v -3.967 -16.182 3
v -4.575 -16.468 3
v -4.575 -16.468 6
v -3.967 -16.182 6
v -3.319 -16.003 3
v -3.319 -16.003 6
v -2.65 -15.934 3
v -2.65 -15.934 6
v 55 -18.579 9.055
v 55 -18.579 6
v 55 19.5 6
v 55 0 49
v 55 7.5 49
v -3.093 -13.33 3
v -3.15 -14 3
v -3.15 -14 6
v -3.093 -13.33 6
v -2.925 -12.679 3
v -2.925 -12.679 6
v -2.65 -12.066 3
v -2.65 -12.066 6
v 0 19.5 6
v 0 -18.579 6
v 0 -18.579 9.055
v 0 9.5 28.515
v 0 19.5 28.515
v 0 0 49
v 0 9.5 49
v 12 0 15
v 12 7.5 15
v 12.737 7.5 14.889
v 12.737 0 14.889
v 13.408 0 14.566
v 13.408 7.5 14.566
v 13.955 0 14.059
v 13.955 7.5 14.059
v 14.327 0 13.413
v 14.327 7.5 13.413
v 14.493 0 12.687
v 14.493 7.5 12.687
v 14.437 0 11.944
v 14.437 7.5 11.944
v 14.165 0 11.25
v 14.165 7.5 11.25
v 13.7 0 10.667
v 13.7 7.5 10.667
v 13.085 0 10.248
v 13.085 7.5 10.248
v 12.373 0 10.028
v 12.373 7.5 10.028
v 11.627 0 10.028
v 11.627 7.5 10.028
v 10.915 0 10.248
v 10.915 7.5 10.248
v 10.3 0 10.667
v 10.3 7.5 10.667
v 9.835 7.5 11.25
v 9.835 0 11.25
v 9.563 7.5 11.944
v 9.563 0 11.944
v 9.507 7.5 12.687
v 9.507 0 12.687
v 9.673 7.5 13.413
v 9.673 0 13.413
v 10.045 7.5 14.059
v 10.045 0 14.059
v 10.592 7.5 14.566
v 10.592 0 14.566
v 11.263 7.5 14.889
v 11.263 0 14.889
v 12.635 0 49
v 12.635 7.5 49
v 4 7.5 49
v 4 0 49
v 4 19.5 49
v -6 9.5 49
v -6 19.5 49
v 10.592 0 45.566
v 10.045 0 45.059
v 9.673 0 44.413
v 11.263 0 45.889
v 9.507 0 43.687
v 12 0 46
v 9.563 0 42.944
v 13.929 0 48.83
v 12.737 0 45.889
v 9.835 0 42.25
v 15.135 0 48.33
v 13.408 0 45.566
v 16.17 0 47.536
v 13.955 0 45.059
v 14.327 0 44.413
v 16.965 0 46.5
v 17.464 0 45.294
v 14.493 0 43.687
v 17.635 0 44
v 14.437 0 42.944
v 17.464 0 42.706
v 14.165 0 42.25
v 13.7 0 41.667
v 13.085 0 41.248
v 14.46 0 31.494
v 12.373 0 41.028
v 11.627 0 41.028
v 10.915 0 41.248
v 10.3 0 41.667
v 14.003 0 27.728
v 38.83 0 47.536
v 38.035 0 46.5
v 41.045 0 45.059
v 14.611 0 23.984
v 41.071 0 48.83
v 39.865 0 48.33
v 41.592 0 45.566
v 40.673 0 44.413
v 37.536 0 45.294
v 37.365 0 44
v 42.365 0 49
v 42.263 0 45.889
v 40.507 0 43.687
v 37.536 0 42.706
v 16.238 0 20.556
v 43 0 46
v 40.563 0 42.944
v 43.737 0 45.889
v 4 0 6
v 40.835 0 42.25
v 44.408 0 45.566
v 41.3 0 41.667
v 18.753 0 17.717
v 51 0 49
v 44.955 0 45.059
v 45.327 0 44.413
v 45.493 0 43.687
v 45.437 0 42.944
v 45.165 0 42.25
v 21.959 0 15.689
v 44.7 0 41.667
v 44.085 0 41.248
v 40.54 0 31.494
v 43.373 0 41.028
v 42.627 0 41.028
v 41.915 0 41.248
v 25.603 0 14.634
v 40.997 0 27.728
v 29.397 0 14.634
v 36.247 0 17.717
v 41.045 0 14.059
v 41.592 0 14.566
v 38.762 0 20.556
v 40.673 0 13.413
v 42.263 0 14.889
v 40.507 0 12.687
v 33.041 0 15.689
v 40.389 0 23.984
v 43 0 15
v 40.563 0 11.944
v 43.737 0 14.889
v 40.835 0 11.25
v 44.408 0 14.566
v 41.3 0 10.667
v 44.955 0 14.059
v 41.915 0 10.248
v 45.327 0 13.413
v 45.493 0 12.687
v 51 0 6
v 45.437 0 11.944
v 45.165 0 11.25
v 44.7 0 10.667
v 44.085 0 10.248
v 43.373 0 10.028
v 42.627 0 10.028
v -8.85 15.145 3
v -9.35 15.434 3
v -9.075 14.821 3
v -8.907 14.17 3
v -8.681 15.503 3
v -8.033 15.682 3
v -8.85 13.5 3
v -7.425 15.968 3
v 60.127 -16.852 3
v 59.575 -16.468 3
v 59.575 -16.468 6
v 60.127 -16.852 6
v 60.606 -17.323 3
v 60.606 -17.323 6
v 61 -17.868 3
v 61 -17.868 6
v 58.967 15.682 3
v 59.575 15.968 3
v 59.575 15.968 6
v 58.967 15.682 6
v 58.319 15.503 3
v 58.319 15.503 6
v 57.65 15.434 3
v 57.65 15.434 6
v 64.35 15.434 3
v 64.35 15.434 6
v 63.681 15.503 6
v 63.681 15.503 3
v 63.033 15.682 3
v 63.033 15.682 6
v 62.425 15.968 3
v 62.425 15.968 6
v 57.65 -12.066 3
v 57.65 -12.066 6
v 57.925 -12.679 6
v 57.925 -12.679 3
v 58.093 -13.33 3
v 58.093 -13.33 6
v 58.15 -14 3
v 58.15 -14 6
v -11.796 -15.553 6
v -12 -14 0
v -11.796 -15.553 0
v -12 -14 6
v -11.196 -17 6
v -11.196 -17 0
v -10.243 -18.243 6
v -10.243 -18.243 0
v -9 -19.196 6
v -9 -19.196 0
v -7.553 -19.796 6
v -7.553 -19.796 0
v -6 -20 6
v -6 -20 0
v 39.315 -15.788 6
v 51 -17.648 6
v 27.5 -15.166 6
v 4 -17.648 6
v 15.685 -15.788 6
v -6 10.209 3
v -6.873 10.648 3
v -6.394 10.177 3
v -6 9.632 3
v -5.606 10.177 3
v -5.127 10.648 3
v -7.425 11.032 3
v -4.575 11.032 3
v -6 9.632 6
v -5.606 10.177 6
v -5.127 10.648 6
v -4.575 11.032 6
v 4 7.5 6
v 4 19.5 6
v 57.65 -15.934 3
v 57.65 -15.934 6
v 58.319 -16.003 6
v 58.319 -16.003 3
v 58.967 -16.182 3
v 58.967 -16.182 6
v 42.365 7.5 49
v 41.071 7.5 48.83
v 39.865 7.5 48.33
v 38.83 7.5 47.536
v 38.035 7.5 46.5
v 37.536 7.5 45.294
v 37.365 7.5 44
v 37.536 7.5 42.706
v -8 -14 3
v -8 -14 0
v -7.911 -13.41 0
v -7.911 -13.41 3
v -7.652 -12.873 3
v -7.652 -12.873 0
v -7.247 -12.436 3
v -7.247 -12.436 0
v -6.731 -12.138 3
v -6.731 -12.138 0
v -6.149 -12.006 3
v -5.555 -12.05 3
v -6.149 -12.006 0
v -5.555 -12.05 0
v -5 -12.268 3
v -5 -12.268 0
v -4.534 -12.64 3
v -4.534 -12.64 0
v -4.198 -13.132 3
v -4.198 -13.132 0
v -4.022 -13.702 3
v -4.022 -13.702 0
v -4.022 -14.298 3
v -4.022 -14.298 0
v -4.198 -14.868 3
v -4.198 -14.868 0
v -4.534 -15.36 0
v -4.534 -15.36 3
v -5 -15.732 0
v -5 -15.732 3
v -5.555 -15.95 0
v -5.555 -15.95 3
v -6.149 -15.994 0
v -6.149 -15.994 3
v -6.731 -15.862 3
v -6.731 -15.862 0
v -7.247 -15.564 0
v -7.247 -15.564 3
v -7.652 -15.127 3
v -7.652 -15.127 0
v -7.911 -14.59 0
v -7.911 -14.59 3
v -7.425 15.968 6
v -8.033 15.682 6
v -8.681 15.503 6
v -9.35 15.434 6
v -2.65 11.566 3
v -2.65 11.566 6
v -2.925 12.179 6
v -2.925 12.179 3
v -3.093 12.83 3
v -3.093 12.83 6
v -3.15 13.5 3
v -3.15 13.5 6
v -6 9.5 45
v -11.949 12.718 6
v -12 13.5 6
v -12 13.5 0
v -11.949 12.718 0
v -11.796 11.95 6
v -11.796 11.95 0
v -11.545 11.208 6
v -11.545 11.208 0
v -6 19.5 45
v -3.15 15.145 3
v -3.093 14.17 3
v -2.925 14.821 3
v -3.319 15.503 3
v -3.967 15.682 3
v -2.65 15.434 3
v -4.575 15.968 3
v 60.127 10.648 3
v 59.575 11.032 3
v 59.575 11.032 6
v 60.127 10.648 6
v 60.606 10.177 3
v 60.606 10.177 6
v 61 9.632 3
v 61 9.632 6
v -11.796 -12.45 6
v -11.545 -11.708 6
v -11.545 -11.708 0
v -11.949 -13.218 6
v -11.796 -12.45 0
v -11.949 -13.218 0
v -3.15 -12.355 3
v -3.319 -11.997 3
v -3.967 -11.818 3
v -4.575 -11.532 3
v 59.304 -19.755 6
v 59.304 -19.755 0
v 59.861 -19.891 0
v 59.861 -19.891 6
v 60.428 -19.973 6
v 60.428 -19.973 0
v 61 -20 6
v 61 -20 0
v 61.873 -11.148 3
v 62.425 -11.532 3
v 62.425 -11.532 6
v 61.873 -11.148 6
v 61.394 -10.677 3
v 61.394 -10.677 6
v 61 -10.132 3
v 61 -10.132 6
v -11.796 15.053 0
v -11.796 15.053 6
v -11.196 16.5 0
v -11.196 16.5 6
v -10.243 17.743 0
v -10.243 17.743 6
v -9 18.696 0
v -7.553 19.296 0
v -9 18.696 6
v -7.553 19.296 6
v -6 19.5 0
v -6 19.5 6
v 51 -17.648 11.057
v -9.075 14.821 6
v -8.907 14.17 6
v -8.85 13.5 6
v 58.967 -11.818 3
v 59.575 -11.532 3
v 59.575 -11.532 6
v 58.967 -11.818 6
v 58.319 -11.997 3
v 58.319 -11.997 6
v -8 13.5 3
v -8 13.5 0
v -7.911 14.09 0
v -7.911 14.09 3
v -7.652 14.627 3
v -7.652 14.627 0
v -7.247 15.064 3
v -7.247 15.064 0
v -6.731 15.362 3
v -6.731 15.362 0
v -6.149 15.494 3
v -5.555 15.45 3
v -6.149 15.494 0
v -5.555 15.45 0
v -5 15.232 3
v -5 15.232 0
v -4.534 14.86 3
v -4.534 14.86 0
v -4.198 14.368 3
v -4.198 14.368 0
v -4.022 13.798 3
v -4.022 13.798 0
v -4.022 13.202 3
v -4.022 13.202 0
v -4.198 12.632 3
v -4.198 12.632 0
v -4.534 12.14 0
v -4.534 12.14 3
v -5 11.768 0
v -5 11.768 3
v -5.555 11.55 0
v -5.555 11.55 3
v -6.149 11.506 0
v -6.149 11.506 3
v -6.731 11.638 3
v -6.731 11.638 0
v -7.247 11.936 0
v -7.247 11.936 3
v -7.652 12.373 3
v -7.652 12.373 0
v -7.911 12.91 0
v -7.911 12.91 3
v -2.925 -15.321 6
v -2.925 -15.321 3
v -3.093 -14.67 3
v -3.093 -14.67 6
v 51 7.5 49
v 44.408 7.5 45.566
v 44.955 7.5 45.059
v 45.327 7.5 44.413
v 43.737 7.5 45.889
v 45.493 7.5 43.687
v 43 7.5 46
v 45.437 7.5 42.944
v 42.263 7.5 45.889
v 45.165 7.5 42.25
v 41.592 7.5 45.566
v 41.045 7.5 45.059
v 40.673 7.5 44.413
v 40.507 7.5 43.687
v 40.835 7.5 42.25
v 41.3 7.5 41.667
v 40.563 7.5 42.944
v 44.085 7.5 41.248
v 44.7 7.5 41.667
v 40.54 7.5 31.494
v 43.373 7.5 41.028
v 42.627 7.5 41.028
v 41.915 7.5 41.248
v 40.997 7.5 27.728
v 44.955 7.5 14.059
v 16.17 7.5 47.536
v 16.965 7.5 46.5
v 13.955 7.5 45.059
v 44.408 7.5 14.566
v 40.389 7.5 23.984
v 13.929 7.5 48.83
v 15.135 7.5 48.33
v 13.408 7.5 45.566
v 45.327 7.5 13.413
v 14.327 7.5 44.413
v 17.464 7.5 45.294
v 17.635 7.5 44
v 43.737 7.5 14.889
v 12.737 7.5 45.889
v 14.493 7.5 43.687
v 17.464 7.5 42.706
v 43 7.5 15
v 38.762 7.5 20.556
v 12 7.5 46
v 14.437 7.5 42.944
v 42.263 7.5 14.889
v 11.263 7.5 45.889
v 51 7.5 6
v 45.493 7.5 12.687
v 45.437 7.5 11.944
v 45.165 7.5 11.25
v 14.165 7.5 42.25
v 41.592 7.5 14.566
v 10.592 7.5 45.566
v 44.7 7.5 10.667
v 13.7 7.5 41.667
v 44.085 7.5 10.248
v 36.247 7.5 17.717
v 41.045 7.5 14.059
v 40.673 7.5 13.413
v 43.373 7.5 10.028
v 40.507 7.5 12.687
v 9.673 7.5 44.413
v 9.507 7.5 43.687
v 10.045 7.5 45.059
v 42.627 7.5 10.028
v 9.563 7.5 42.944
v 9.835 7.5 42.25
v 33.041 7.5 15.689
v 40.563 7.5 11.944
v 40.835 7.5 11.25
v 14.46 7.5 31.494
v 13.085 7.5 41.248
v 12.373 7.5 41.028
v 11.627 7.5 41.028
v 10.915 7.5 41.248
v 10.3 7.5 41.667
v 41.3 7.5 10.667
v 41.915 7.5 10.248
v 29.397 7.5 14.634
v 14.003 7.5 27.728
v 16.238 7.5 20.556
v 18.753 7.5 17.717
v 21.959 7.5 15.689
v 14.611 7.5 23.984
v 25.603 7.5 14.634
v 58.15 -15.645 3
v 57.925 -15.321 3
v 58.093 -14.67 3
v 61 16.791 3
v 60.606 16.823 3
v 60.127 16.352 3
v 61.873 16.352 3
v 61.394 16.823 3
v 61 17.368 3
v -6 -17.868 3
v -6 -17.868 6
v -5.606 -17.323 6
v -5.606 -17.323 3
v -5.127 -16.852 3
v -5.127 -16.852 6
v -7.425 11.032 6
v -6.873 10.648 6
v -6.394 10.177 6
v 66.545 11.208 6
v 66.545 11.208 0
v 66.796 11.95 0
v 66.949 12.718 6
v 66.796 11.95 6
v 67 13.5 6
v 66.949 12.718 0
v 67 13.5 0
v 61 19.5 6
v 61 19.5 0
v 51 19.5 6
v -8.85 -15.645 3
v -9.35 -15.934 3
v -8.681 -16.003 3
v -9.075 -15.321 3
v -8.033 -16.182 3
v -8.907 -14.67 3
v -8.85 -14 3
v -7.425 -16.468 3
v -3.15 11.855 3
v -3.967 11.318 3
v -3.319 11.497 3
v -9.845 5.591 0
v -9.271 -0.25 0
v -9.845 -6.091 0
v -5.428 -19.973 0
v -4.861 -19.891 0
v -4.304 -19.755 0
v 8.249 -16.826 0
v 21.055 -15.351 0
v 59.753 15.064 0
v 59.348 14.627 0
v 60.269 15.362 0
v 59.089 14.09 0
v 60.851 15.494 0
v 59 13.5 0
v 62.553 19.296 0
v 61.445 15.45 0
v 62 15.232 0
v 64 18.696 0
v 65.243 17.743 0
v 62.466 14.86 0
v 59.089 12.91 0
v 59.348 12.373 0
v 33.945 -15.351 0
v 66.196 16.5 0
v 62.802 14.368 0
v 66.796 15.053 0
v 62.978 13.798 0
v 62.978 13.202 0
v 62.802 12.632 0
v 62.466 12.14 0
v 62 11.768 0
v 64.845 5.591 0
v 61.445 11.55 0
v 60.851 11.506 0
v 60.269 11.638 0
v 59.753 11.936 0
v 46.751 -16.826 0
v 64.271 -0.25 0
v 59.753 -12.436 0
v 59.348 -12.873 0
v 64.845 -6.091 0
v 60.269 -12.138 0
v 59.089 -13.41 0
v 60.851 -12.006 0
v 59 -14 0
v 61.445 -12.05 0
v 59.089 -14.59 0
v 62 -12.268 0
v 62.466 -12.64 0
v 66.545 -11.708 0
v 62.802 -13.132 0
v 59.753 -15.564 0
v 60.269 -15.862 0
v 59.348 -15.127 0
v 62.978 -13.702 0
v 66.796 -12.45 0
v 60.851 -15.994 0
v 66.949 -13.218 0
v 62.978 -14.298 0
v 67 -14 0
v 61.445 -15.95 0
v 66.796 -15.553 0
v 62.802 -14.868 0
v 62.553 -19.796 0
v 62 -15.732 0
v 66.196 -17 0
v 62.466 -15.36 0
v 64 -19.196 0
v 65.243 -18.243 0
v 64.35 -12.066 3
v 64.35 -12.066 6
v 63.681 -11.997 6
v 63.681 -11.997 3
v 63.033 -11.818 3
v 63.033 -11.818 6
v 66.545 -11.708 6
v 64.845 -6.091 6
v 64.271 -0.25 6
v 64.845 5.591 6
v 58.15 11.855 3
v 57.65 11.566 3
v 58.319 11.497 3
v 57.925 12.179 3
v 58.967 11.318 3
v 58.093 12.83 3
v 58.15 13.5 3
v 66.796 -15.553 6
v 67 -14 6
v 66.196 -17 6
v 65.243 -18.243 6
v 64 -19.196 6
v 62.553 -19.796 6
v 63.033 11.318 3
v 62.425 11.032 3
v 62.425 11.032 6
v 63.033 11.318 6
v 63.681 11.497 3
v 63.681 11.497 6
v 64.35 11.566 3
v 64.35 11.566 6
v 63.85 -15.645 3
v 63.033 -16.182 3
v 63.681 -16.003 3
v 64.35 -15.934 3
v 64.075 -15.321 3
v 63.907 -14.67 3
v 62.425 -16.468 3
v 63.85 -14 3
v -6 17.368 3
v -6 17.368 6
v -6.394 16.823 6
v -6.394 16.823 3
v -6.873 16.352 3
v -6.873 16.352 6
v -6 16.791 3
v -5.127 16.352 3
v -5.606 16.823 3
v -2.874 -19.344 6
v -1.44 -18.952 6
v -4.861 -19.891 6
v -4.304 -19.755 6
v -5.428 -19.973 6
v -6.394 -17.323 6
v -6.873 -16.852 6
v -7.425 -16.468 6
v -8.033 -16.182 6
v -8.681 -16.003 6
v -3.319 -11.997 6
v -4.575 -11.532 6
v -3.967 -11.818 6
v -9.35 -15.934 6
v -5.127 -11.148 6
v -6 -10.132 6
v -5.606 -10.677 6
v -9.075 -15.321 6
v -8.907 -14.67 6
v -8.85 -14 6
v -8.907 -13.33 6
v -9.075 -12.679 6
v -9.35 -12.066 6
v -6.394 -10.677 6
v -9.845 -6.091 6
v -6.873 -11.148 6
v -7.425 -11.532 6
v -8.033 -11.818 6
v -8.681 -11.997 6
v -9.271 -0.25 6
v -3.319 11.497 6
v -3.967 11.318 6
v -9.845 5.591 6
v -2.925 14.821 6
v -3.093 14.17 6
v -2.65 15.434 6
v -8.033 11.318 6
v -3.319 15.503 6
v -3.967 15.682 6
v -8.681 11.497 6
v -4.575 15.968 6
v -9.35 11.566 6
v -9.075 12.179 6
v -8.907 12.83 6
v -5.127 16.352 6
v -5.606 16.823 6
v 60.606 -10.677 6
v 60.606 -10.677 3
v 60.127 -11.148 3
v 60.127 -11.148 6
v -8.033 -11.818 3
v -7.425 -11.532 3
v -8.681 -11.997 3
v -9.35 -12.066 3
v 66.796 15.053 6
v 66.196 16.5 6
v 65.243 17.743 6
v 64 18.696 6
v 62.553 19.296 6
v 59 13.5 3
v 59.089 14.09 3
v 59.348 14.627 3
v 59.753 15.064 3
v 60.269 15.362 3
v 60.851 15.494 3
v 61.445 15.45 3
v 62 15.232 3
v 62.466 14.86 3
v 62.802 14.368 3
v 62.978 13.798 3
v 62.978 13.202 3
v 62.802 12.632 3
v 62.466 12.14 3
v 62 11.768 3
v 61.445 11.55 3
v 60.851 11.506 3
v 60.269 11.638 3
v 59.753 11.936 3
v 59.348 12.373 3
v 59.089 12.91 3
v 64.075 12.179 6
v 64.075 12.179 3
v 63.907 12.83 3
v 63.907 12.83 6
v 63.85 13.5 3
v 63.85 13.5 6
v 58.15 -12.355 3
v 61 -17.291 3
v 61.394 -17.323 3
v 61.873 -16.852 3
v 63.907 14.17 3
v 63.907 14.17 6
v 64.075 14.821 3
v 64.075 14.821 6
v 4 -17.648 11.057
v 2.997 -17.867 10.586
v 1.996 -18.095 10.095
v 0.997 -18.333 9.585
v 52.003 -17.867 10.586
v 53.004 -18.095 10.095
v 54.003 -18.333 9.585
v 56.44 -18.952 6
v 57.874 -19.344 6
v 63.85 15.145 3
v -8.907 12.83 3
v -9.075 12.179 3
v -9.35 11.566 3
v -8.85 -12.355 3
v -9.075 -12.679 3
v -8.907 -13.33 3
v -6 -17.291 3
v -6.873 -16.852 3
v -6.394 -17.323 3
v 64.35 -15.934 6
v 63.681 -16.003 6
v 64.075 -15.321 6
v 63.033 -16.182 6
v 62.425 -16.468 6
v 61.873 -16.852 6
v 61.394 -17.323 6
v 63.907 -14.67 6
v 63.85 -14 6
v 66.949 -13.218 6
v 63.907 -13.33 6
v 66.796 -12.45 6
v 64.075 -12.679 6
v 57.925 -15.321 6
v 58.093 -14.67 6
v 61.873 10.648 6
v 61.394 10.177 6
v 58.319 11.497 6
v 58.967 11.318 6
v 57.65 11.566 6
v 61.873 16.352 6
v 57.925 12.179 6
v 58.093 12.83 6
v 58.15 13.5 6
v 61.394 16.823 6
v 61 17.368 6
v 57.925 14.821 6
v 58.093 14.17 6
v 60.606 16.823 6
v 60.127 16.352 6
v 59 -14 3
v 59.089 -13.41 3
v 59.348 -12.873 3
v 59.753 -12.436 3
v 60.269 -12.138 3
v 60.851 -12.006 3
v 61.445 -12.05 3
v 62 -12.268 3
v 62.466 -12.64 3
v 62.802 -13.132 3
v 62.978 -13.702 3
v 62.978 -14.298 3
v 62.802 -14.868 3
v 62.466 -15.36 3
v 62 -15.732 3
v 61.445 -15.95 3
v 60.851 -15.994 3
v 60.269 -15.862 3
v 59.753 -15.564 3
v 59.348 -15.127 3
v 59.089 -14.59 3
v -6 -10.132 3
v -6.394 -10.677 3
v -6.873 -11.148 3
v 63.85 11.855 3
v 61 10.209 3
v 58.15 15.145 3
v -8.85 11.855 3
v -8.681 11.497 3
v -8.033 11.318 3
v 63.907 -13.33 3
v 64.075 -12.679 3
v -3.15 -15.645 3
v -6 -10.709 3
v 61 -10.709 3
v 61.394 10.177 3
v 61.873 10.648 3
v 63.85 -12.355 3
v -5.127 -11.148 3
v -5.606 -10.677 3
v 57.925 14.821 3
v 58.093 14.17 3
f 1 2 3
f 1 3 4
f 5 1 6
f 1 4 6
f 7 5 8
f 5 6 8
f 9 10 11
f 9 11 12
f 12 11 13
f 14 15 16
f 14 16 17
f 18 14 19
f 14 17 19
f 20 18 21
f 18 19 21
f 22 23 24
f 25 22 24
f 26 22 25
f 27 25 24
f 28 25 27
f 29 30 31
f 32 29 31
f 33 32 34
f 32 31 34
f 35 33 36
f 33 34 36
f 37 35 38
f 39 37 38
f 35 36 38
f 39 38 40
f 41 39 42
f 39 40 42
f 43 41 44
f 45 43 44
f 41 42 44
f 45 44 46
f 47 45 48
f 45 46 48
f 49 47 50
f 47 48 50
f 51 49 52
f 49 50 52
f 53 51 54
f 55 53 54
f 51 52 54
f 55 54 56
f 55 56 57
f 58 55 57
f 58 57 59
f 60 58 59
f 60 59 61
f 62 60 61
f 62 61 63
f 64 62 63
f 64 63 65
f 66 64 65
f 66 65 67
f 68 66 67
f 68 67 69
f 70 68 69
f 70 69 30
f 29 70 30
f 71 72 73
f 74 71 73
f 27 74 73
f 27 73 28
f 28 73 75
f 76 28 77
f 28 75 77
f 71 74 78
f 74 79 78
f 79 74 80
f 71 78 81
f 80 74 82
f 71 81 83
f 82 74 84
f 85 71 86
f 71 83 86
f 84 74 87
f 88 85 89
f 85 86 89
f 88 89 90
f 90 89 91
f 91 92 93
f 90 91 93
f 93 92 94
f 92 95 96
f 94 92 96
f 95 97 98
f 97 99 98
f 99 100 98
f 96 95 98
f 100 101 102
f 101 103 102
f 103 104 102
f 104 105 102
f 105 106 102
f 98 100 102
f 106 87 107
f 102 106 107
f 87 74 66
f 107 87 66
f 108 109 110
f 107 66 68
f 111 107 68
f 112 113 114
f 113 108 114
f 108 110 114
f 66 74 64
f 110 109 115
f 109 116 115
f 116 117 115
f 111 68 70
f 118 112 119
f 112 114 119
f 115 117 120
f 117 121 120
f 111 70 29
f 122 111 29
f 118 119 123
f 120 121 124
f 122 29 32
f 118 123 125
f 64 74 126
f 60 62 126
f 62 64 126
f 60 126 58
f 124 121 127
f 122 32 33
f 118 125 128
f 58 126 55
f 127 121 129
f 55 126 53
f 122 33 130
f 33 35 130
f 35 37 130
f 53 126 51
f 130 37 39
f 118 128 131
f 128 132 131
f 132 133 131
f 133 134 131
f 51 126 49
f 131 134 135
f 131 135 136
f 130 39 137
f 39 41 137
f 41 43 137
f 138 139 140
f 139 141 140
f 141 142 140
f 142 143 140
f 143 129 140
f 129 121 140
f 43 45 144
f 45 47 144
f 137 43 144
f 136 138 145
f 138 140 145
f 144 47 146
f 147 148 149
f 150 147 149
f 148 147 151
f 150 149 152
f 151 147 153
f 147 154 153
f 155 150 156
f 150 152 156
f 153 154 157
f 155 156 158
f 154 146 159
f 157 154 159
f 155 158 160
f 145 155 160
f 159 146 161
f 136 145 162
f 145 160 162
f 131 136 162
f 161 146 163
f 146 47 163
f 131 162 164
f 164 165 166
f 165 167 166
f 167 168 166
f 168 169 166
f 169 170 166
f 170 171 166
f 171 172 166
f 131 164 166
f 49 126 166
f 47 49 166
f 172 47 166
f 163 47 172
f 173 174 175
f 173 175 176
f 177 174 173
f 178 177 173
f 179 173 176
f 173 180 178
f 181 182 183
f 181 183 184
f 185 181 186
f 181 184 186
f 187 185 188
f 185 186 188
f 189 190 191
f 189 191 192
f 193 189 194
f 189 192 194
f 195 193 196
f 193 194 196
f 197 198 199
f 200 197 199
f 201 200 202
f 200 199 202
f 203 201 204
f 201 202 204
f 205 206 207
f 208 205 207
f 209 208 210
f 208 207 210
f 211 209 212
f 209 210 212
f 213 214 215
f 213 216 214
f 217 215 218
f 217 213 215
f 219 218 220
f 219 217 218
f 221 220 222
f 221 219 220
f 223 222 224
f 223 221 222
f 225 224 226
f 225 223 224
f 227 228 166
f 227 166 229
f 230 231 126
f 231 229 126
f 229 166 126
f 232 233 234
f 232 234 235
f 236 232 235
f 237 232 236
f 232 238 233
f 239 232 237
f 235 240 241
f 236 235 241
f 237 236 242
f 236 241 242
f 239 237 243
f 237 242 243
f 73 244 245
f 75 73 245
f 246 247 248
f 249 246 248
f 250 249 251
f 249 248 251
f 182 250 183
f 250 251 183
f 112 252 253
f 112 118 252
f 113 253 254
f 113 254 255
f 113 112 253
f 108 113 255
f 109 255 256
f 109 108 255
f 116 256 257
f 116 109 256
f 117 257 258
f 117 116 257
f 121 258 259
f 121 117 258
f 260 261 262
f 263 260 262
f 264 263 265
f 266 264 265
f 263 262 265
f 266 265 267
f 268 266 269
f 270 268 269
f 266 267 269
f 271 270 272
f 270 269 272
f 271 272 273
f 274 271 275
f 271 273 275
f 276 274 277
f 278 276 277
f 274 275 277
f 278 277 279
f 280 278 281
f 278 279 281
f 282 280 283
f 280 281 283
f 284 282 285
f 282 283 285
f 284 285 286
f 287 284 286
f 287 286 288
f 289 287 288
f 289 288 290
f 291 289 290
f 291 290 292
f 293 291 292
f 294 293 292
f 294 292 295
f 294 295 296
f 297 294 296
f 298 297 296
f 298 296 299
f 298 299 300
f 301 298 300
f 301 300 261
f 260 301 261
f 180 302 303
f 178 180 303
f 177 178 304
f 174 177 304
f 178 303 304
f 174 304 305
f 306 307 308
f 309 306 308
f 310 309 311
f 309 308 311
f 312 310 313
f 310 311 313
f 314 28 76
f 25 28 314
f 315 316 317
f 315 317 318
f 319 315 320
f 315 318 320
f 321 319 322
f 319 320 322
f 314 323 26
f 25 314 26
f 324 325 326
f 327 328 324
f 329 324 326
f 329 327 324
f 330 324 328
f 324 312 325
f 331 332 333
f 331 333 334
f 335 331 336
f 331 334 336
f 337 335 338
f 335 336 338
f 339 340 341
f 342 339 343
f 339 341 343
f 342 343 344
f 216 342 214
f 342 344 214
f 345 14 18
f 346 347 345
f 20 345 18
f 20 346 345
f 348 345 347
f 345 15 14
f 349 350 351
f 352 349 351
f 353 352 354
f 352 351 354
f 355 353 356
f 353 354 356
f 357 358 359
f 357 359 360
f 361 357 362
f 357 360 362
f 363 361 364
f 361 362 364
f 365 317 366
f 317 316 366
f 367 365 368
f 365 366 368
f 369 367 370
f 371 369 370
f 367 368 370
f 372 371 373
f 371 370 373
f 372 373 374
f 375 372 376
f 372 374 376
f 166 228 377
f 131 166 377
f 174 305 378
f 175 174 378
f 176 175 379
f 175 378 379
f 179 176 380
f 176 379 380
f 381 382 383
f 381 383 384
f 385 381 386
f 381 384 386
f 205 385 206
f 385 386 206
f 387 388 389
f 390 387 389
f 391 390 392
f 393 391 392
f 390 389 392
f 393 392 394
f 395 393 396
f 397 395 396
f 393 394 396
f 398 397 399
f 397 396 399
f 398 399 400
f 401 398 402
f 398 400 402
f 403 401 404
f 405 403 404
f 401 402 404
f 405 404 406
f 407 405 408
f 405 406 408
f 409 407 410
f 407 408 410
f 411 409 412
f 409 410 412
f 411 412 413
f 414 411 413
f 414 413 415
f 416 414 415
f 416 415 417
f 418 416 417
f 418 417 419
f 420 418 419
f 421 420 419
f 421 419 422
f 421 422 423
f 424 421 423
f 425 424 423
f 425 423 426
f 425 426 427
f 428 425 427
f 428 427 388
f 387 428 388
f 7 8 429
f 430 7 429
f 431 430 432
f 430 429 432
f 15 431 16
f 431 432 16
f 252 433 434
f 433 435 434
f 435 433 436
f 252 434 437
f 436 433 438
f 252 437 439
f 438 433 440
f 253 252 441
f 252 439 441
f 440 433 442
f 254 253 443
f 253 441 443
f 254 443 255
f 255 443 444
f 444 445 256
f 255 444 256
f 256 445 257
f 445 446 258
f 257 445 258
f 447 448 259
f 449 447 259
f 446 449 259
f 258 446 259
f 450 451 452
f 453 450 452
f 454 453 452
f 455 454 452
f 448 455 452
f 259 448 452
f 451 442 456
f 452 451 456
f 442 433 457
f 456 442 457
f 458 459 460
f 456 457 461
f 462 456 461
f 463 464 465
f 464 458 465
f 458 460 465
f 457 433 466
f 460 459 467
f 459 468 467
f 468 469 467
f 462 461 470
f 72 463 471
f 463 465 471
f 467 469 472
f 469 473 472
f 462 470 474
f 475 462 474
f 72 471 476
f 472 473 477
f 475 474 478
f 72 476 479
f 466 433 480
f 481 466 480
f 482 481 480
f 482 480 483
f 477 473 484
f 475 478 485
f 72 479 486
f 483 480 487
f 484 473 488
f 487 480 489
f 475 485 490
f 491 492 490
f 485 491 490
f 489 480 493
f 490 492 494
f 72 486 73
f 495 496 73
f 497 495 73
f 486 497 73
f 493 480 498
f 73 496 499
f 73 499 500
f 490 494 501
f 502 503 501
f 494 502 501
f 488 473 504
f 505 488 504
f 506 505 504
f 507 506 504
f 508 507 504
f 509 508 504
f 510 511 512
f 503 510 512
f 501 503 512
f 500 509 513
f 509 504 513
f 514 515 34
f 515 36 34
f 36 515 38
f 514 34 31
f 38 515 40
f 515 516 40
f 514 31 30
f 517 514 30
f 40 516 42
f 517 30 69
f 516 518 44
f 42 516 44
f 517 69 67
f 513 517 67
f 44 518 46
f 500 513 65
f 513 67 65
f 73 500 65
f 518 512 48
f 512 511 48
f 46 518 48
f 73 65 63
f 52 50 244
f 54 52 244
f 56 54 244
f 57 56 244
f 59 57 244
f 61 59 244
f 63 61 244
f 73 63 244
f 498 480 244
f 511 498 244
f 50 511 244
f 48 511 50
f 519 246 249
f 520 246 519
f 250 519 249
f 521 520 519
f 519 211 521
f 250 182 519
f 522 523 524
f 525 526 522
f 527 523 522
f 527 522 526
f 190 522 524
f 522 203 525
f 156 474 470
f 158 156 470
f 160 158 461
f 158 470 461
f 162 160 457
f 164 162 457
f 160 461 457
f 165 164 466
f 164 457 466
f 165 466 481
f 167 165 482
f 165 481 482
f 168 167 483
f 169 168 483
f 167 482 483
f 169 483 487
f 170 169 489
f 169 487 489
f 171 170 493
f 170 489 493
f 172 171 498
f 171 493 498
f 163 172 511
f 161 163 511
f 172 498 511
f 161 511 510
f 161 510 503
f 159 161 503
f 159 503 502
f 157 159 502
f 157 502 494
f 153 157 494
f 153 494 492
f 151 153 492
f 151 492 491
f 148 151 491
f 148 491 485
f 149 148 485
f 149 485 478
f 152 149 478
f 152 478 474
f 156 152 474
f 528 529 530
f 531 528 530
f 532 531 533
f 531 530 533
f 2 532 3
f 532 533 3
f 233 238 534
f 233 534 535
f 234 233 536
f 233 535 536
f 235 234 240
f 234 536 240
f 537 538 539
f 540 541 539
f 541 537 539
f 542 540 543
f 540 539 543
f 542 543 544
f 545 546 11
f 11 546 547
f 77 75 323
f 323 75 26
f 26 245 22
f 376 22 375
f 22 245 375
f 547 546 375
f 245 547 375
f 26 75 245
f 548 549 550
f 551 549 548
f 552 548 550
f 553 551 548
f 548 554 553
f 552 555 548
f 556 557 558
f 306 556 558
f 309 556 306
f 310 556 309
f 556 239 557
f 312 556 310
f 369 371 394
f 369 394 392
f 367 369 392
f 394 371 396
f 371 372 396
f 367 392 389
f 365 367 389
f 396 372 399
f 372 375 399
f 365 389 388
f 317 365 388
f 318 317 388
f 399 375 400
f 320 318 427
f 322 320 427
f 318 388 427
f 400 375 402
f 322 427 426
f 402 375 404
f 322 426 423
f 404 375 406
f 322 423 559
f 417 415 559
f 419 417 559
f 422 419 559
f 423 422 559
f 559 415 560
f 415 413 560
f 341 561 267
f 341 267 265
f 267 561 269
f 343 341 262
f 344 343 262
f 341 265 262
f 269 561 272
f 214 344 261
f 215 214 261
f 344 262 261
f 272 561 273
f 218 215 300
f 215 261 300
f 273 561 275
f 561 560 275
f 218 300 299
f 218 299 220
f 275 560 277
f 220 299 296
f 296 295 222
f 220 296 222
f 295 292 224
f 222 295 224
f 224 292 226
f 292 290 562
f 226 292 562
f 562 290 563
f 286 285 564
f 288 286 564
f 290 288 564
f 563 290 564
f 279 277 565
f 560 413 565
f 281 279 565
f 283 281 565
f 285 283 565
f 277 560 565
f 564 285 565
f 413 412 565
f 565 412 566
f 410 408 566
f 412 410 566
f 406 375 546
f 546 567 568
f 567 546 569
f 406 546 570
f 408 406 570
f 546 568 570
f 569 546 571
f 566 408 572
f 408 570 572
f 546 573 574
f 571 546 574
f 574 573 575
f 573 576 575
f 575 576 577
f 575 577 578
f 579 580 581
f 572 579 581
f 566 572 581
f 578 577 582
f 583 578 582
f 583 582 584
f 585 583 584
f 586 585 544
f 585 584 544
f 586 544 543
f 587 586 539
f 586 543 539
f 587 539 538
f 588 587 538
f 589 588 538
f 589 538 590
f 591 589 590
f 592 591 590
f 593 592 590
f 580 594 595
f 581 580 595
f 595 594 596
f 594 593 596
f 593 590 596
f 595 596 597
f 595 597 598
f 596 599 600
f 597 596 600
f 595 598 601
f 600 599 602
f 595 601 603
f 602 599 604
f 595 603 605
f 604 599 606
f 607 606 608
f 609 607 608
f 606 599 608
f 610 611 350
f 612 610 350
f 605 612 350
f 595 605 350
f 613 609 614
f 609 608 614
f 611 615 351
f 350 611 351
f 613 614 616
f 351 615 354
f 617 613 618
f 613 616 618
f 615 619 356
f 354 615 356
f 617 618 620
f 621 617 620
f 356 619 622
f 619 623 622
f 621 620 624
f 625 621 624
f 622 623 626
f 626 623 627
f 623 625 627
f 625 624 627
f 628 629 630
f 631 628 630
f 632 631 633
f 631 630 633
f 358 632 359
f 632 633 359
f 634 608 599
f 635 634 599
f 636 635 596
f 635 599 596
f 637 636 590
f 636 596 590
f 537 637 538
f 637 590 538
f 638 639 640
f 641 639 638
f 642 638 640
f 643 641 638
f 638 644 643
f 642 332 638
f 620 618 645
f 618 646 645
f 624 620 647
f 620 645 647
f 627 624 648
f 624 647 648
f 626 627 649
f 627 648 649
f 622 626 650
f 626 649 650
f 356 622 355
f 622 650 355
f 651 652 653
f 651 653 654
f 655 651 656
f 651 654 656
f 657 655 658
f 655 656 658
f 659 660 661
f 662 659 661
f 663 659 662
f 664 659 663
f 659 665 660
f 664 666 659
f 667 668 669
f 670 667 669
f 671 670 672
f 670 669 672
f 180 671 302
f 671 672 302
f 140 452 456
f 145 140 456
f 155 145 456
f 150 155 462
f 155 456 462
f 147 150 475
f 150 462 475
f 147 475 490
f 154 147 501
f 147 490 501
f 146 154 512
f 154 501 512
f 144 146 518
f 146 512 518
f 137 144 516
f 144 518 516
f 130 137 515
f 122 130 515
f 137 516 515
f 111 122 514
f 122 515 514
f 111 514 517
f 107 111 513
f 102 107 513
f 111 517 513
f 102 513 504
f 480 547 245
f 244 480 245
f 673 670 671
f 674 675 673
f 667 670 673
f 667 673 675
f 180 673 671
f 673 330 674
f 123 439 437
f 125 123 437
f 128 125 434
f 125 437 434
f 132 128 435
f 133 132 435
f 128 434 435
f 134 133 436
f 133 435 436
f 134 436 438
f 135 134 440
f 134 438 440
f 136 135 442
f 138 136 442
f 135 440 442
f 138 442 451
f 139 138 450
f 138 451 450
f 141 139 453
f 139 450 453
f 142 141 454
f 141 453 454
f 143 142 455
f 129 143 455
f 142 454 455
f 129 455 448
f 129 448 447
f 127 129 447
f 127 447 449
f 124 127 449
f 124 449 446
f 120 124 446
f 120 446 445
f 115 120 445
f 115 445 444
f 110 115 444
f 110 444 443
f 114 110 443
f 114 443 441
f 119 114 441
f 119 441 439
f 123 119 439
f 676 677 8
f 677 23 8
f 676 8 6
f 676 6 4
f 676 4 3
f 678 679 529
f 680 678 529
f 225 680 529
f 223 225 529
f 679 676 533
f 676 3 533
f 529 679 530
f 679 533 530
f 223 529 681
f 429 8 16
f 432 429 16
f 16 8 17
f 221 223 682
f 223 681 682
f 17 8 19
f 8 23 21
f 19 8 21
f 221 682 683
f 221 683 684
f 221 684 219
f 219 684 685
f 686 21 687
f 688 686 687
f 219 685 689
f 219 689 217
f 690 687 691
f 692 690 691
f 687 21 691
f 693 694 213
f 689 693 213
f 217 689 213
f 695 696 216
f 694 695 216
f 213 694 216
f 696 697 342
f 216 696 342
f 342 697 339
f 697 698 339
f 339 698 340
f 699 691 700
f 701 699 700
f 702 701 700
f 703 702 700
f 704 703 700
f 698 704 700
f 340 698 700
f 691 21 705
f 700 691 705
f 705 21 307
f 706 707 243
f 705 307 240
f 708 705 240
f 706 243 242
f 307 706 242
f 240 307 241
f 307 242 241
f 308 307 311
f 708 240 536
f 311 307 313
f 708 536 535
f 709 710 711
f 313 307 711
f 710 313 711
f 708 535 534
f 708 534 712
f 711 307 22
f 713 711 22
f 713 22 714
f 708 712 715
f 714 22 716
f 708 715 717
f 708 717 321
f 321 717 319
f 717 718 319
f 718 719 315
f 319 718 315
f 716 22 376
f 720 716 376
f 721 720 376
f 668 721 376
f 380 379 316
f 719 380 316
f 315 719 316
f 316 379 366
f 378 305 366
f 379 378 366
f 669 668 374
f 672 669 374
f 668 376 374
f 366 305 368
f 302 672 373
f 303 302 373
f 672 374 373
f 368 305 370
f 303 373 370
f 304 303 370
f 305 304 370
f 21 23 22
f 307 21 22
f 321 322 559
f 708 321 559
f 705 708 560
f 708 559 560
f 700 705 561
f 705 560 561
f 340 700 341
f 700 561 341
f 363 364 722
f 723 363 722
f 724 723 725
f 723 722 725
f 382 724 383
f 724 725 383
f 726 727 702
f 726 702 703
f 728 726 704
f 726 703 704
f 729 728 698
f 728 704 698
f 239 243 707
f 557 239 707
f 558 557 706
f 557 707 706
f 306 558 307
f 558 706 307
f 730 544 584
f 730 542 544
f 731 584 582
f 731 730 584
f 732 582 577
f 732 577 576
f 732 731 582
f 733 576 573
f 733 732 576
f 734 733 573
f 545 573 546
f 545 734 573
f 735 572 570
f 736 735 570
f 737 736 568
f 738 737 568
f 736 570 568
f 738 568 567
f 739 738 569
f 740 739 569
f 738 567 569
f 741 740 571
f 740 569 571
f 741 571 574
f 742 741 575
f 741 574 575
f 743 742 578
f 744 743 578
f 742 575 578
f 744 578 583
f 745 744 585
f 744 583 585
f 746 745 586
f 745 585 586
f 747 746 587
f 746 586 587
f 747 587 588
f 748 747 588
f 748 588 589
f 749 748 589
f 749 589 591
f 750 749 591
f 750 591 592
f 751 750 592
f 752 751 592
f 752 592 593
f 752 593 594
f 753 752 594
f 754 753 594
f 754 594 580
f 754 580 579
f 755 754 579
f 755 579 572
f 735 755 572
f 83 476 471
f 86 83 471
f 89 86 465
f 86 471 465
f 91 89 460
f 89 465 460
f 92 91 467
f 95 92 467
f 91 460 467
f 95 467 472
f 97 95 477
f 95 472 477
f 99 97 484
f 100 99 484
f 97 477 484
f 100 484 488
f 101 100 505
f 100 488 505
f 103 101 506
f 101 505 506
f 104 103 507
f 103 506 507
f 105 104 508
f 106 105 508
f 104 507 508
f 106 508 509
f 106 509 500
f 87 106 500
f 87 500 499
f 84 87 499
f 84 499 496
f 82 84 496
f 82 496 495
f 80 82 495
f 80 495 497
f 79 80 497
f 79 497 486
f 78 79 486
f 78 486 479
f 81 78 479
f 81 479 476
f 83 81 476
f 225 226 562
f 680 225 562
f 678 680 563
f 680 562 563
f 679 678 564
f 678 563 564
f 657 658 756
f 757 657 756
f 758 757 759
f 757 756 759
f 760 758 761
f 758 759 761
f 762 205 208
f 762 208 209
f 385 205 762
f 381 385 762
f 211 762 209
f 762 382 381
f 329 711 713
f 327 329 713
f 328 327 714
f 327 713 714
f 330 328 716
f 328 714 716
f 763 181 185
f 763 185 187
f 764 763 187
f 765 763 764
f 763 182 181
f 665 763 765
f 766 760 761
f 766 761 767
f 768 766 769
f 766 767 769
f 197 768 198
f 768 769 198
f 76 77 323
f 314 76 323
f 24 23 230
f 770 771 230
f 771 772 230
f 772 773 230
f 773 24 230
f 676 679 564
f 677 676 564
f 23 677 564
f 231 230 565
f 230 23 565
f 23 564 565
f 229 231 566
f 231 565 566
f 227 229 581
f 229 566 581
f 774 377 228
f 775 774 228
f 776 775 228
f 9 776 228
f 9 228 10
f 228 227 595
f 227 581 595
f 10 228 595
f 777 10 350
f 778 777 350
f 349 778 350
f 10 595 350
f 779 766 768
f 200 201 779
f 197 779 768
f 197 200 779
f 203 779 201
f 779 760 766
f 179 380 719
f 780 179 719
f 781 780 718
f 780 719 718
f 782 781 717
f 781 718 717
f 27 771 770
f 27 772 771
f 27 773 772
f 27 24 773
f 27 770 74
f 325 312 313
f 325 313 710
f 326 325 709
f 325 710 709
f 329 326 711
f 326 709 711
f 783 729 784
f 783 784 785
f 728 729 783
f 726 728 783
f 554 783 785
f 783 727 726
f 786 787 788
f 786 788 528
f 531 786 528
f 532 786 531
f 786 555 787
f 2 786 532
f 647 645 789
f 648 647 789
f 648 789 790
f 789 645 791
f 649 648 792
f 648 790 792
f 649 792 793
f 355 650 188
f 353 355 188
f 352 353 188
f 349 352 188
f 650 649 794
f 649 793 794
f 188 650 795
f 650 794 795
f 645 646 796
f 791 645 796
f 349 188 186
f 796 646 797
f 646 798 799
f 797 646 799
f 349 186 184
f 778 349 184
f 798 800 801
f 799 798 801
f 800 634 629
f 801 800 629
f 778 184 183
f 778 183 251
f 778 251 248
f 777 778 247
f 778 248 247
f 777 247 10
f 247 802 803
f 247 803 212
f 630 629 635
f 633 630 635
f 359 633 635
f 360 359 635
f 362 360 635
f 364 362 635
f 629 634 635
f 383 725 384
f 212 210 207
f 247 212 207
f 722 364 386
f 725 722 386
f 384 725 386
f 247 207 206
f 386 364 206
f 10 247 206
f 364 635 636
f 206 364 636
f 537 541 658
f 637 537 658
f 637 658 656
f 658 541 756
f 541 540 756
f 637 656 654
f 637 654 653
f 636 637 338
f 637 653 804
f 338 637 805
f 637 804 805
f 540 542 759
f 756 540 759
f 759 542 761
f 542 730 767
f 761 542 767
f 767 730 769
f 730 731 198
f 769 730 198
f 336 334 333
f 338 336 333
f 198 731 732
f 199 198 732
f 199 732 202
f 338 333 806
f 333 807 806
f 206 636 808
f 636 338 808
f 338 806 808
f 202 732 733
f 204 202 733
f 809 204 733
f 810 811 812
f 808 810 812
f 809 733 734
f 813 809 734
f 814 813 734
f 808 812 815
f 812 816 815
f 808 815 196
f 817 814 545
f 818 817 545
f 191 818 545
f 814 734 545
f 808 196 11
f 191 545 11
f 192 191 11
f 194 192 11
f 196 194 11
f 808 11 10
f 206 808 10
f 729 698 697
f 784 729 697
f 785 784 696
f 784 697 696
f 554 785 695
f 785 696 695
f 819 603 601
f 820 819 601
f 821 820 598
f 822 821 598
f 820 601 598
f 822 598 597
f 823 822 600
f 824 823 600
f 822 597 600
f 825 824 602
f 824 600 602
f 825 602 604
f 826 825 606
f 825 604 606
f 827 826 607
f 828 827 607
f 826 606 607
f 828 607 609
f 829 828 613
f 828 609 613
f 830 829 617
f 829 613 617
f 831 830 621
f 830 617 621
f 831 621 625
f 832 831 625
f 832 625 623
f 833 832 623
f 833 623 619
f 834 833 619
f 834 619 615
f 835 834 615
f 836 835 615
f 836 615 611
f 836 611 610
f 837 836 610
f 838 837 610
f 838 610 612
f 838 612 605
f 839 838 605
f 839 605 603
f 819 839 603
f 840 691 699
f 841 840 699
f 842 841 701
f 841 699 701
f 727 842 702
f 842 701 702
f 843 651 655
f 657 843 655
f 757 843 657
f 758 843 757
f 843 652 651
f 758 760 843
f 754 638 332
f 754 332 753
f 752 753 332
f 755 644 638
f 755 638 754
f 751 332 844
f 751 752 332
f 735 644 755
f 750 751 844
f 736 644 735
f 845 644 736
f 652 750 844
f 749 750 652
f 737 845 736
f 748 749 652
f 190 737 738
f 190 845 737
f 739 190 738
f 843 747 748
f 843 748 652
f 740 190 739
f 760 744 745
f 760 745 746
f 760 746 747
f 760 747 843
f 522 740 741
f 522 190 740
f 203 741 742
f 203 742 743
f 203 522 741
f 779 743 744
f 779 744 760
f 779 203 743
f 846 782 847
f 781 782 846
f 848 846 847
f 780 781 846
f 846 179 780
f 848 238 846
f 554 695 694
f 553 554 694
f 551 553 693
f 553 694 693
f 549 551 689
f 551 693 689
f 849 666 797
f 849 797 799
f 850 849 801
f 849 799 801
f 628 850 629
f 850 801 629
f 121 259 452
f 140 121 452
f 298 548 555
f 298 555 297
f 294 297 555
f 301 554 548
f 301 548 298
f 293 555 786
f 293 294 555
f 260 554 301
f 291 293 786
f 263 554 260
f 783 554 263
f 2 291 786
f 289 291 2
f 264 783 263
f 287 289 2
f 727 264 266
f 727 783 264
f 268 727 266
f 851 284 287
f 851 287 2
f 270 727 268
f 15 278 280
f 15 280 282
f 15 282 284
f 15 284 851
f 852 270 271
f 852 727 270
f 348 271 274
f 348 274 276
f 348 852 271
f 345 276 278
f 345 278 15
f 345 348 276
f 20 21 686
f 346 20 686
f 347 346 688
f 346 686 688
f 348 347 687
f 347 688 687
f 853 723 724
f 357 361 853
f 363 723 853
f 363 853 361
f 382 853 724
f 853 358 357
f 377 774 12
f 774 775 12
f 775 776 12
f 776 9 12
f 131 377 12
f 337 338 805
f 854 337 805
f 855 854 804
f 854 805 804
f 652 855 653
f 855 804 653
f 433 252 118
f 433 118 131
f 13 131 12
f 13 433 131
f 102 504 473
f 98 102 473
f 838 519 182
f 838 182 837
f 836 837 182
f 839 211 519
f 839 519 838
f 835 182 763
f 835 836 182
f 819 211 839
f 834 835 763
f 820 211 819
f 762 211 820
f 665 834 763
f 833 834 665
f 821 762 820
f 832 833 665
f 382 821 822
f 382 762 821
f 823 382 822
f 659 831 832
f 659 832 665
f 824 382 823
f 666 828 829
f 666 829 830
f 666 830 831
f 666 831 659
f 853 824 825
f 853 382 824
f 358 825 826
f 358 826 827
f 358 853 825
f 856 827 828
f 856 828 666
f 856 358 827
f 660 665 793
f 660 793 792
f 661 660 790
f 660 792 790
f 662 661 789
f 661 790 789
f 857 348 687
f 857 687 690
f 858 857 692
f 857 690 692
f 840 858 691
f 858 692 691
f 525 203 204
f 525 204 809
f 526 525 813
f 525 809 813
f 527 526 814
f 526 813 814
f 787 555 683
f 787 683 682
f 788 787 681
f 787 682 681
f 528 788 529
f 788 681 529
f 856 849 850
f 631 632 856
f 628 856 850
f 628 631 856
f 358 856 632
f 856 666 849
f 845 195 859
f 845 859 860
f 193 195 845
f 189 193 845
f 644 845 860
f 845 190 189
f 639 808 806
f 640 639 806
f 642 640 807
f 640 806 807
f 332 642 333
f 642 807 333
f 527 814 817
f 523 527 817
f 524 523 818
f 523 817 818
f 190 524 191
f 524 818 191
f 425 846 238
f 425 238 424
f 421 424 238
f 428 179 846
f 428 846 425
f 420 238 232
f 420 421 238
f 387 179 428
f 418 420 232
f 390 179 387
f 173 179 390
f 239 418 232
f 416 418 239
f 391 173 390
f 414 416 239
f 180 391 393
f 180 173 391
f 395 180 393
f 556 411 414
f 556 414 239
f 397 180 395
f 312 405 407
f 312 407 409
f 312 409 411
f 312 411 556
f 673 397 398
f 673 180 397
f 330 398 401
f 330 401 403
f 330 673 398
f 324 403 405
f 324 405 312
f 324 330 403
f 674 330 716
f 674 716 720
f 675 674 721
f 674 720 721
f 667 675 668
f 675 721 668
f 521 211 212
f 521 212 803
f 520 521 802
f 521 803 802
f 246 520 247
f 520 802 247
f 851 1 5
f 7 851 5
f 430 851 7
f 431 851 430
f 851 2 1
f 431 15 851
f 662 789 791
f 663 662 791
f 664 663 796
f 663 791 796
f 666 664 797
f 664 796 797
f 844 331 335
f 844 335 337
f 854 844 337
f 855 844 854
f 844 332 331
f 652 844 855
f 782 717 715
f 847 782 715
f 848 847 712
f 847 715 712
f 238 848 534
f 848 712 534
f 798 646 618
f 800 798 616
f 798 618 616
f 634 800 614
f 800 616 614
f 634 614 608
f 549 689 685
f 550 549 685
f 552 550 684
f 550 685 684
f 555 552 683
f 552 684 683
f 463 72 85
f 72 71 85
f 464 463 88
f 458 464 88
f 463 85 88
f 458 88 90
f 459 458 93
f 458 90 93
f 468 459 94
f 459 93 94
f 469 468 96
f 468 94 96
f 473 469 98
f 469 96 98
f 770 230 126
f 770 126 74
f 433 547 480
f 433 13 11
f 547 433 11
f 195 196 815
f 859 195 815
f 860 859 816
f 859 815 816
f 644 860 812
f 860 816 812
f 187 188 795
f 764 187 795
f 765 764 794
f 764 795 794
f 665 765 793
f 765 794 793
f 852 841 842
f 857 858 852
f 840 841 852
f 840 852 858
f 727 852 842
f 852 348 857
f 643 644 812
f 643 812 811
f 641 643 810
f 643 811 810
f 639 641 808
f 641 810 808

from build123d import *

# Parameters (mm, degrees)
BOSS_EXTRUDE1_DEPTH  = 49
SKETCH2_R            = 2.5
CUT_EXTRUDE1_DEPTH   = 8.5
SKETCH4_W            = 79
SKETCH4_H            = 39.5
BOSS_EXTRUDE2_DEPTH  = 6
BOSS_EXTRUDE3_DEPTH  = 4
SKETCH5_R            = 2
CUT_EXTRUDE3_DEPTH   = 10
BOSS_EXTRUDE4_DEPTH  = 4
FILLET1_R            = 6
FILLET2_R            = 5
CUT_EXTRUDE5_DEPTH   = 3
CUT_EXTRUDE6_DEPTH   = 50
CUT_EXTRUDE7_DEPTH   = 3
LPATTERN1_COUNT      = 2
LPATTERN1_PITCH      = 67
LPATTERN1_COUNT_DIR2 = 2
LPATTERN1_PITCH_DIR2 = 27.5
BOSS_EXTRUDE5_DEPTH  = 10


with BuildPart() as part:
    # Sketch1 → Boss-Extrude1 (new body)
    with BuildSketch(Plane.XY):
        Polygon((4, 7.5), (4, 19.5), (0, 19.5), (0, 0), (55, 0), (55, 7.5), align=None)
    extrude(amount=BOSS_EXTRUDE1_DEPTH)

    # Sketch2 → Cut-Extrude1 (cut, through all)
    with BuildSketch(Plane(origin=(0, 7.5, 0), x_dir=(1, 0, 0), z_dir=(0, 1, 0))):
        with Locations(Location((12, -12.5, 0), (0, 0, 270))):  # turned: the seam where the file's is
            Circle(SKETCH2_R)
        with Locations(Location((43, -12.5, 0), (0, 0, 270))):  # turned: the seam where the file's is
            Circle(SKETCH2_R)
        with Locations(Location((12, -43.5, 0), (0, 0, 270))):  # turned: the seam where the file's is
            Circle(SKETCH2_R)
        with Locations(Location((43, -43.5, 0), (0, 0, 270))):  # turned: the seam where the file's is
            Circle(SKETCH2_R)
        with BuildLine():
            Line((14.460001345, -31.494057109), (19.150704606, -49))
            Line((19.150704606, -49), (35.849295394, -49))
            Line((35.849295394, -49), (40.539998655, -31.494057109))
            ThreePointArc((40.539998655, -31.494057109), (27.5, -14.5), (14.460001345, -31.494057109))
        make_face()
    extrude(amount=-CUT_EXTRUDE1_DEPTH, mode=Mode.SUBTRACT)

    # Sketch4 → Boss-Extrude2 (add)
    with BuildSketch(Plane(origin=(0, 0, 0), x_dir=(-1, 0, 0), z_dir=(0, 0, -1))):
        with Locations((-27.5, -0.25)):
            Rectangle(SKETCH4_W, SKETCH4_H)
    extrude(amount=-BOSS_EXTRUDE2_DEPTH)

    # Sketch6 → Boss-Extrude3 (add)
    with BuildSketch(Plane.ZY):
        Polygon((6, -20), (49, 0), (6, 0), align=None)
    extrude(amount=-BOSS_EXTRUDE3_DEPTH)

    # Sketch5 → Cut-Extrude3 (cut)
    with BuildSketch(Plane(origin=(0, 0, 0), x_dir=(-1, 0, 0), z_dir=(0, 0, -1))):
        with Locations((-61, 13.5)):
            Circle(SKETCH5_R)
        with Locations((-61, -14)):
            Circle(SKETCH5_R)
        with Locations((6, 13.5)):
            Circle(SKETCH5_R)
        with Locations((6, -14)):
            Circle(SKETCH5_R)
    extrude(amount=-CUT_EXTRUDE3_DEPTH, mode=Mode.SUBTRACT)

    # Sketch7 → Boss-Extrude4 (add)
    with BuildSketch(Plane(origin=(55, 0, 0), x_dir=(0, 0, -1), z_dir=(1, 0, 0))):
        Polygon((-49, 7.5), (-6, 19.5), (0, 19.5), (0, -20), (-6, -20), (-49, 0), align=None)
    extrude(amount=-BOSS_EXTRUDE4_DEPTH)

    # Fillet1
    fillet1_edges = [part.edges().sort_by_distance(p)[0] for p in [
        (67, 19.5, 3),
        (-12, 19.5, 3),
        (-12, -20, 3),
        (67, -20, 3),
    ]]
    fillet(fillet1_edges, radius=FILLET1_R)

    # Fillet2
    fillet2_edges = [part.edges().sort_by_distance(p)[0] for p in [
        (35.849295394, 3.75, 49),
        (19.150704606, 3.75, 49),
    ]]
    fillet(fillet2_edges, radius=FILLET2_R)

    # Sketch9 → Cut-Extrude5 (cut)
    with BuildSketch(Plane.XY.offset(6)):
        Polygon((-6, 16.790896534), (-8.85, 15.145448267), (-8.85, 11.854551733), (-6, 10.209103466), (-3.15, 11.854551733), (-3.15, 15.145448267), align=None)
        Polygon((-6, -10.709103466), (-8.85, -12.354551733), (-8.85, -15.645448267), (-6, -17.290896534), (-3.15, -15.645448267), (-3.15, -12.354551733), align=None)
        Polygon((61, -10.709103466), (58.15, -12.354551733), (58.15, -15.645448267), (61, -17.290896534), (63.85, -15.645448267), (63.85, -12.354551733), align=None)
        Polygon((61, 10.209103466), (63.85, 11.854551733), (63.85, 15.145448267), (61, 16.790896534), (58.15, 15.145448267), (58.15, 11.854551733), align=None)
    extrude(amount=-CUT_EXTRUDE5_DEPTH, mode=Mode.SUBTRACT)

    # Sketch10 → Cut-Extrude6 (cut, through all)
    with BuildSketch(Plane(origin=(0, 0, 0), x_dir=(-1, 0, 0), z_dir=(0, 0, -1))):
        with BuildLine():
            Line((-61, 19.5), (-61, 26.194717678))
            Line((-61, 26.194717678), (-93.21372943, 26.194717678))
            Line((-93.21372943, 26.194717678), (-93.21372943, -32.483465835))
            Line((-93.21372943, -32.483465835), (20.656804912, -32.483465835))
            Line((20.656804912, -32.483465835), (20.656804912, 27.240467483))
            Line((20.656804912, 27.240467483), (6, 27.240467483))
            Line((6, 27.240467483), (6, 19.5))
            ThreePointArc((6, 19.5), (10.987484336, 16.835416016), (11.545111711, 11.208333333))
            ThreePointArc((11.545111711, 11.208333333), (9.270670267, -0.25), (11.545111711, -11.708333333))
            ThreePointArc((11.545111711, -11.708333333), (10.460015748, -18.013509627), (4.303797468, -19.755249514))
            ThreePointArc((4.303797468, -19.755249514), (-27.5, -15.166177907), (-59.303797468, -19.755249514))
            ThreePointArc((-59.303797468, -19.755249514), (-65.460015748, -18.013509627), (-66.545111711, -11.708333333))
            ThreePointArc((-66.545111711, -11.708333333), (-64.270670267, -0.25), (-66.545111711, 11.208333333))
            ThreePointArc((-66.545111711, 11.208333333), (-65.987484336, 16.835416016), (-61, 19.5))
        make_face()
    extrude(amount=-CUT_EXTRUDE6_DEPTH, mode=Mode.SUBTRACT)

    # Sketch11 → Cut-Extrude7 (cut)
    with BuildSketch(Plane.XY.offset(6)):
        with BuildLine():
            ThreePointArc((-9.35, 15.434123402), (-8.85, 13.5), (-9.35, 11.565876598))
            ThreePointArc((-9.35, 11.565876598), (-7.425, 11.031827599), (-6, 9.631753196))
            ThreePointArc((-6, 9.631753196), (-4.575, 11.031827599), (-2.65, 11.565876598))
            ThreePointArc((-2.65, 11.565876598), (-3.15, 13.5), (-2.65, 15.434123402))
            ThreePointArc((-2.65, 15.434123402), (-4.575, 15.968172401), (-6, 17.368246804))
            ThreePointArc((-6, 17.368246804), (-7.425, 15.968172401), (-9.35, 15.434123402))
        make_face()
    cut_extrude7 = extrude(amount=-CUT_EXTRUDE7_DEPTH, mode=Mode.SUBTRACT)

    # LPattern1: Cut-Extrude7 2 × 2
    with Locations(*[(i * LPATTERN1_PITCH, -j * LPATTERN1_PITCH_DIR2, 0) for i in range(LPATTERN1_COUNT) for j in range(LPATTERN1_COUNT_DIR2) if (i, j) != (0, 0)]):
        add(cut_extrude7, mode=Mode.SUBTRACT)

    # Sketch12 → Boss-Extrude5 (add)
    with BuildSketch(Plane(origin=(0, 19.5, 0), x_dir=(1, 0, 0), z_dir=(0, 1, 0))):
        Polygon((0, -49), (-6, -49), (-6, -45), (0, -28.515135483), align=None)
    extrude(amount=-BOSS_EXTRUDE5_DEPTH)


solid = part.part
